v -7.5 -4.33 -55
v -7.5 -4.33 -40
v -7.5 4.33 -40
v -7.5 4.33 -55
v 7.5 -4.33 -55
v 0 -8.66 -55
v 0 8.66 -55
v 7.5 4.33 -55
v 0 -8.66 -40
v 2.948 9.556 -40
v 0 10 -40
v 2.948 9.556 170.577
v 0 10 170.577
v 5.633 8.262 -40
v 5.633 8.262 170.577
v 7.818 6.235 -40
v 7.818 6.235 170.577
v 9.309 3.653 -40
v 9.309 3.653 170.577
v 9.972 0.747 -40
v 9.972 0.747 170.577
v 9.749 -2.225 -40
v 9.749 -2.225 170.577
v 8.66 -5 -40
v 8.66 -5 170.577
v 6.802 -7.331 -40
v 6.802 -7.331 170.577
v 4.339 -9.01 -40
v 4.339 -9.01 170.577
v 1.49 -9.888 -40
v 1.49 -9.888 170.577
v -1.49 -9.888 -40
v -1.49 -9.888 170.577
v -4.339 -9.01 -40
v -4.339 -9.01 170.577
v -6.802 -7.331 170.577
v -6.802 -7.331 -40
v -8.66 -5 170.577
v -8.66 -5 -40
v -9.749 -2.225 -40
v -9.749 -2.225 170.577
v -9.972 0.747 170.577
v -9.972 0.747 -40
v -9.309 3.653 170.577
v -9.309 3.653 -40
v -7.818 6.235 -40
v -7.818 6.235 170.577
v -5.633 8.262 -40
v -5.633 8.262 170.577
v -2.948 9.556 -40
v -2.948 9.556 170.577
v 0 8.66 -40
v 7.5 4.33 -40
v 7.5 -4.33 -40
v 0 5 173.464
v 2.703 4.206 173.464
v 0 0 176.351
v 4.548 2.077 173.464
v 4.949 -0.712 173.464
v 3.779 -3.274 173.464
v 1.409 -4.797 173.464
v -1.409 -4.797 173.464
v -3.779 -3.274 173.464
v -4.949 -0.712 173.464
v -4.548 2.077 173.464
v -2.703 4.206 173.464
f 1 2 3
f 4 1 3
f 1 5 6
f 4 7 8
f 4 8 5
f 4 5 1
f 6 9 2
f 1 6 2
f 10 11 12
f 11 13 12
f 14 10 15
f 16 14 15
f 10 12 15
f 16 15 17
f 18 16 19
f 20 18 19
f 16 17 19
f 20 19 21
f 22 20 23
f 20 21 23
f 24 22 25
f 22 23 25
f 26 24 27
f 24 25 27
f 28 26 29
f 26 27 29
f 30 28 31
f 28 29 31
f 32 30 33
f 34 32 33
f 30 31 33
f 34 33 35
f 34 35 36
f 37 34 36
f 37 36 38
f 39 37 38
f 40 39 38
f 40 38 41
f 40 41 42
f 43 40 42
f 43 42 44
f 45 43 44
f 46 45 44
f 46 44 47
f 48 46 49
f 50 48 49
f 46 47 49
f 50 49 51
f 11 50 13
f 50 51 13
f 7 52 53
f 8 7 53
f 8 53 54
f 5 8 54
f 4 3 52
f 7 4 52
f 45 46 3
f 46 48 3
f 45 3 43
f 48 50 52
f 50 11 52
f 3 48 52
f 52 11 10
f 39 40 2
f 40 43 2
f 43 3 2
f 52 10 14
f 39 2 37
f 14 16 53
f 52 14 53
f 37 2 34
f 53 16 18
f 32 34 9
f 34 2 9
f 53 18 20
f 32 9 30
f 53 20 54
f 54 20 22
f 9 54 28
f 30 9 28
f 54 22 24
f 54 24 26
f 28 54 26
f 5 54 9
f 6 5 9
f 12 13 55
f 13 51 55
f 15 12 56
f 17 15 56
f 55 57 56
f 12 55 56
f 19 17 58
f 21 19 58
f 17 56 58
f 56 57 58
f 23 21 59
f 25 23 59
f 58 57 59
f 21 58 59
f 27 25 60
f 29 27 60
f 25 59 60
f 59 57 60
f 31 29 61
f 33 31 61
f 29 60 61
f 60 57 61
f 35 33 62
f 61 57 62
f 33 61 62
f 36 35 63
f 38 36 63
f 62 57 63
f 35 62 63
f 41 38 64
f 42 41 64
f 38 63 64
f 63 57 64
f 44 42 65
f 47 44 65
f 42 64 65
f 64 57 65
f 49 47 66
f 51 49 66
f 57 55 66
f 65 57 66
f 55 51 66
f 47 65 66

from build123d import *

# Parameters (mm, degrees)
EXTRUDE_1_DEPTH = 15


with BuildPart() as part:
    # Эскиз1 → Повернуть1 (revolve)
    with BuildSketch(Plane(origin=(0, 0, 0), x_dir=(0, 0, -1), z_dir=(1, 0, 0))):
        Polygon((-176.350852961, 0), (40, 0), (40, 10), (-170.577350269, 10), align=None)
    revolve(axis=Axis((0, 0, 756.580802456), (0, 0, -1)))

    # Эскиз4 → Бобышка-Вытянуть1 (add)
    with BuildSketch(Plane(origin=(0, 0, -40), x_dir=(-1, 0, 0), z_dir=(0, 0, -1))):
        Polygon((0, 8.660254038), (-7.5, 4.330127019), (-7.5, -4.330127019), (0, -8.660254038), (7.5, -4.330127019), (7.5, 4.330127019), align=None)
    extrude(amount=EXTRUDE_1_DEPTH)


solid = part.part
